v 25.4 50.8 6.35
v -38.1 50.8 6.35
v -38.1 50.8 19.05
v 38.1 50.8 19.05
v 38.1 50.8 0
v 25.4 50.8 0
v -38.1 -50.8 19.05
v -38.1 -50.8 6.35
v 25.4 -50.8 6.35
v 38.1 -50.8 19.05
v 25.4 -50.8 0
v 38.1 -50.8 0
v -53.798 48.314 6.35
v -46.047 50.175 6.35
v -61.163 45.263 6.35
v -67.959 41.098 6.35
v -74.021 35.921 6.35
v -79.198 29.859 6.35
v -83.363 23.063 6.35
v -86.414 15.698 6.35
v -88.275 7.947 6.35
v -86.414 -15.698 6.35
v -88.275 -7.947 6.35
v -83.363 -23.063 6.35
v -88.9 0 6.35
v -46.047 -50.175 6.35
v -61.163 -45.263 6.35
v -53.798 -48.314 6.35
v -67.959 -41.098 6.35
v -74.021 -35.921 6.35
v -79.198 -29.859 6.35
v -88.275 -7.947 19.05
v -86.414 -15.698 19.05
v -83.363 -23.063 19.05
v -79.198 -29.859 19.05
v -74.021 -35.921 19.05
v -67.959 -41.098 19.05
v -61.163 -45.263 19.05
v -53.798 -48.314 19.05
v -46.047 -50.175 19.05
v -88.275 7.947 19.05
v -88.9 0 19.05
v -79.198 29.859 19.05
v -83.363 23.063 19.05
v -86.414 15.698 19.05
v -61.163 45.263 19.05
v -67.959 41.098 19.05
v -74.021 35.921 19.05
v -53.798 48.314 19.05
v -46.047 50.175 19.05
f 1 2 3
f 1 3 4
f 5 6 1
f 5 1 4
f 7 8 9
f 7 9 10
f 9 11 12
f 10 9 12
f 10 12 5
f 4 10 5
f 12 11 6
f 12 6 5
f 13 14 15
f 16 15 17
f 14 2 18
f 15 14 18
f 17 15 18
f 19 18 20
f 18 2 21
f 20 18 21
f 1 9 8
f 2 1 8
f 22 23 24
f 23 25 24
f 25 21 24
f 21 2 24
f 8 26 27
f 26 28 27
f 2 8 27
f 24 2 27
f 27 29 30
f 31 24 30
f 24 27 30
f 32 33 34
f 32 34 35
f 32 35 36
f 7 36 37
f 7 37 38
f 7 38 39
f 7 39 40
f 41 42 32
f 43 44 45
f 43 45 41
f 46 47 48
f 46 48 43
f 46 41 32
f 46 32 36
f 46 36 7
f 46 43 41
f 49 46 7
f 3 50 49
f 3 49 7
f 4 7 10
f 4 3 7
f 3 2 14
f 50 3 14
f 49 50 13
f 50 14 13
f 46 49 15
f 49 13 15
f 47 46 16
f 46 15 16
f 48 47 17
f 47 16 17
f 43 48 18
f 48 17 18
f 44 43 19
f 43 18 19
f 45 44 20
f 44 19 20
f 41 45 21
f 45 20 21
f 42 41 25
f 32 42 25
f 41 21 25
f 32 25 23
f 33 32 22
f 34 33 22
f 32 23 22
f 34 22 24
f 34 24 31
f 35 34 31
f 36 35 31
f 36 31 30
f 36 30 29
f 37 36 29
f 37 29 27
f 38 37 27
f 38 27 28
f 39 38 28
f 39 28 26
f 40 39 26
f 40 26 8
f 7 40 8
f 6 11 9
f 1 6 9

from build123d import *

# Parameters (mm, degrees)
F0_W     = 76.2
F0_H     = 101.6
F1_DEPTH = 19.05
F2_W     = 63.5
F2_H     = 6.35
F3_DEPTH = 164.846


with BuildPart() as f1:
    # F0 (on Top) → F1 (new body)
    with BuildSketch(Plane.XY):
        Rectangle(F0_W, F0_H)
        with BuildLine():
            ThreePointArc((-38.1, 50.8), (-88.9, 0), (-38.1, -50.8))
            Line((-38.1, -50.8), (-38.1, 50.8))
        make_face()
    extrude(amount=F1_DEPTH)

    # F2 (on face) → F3 (cut)
    with BuildSketch(Plane.XZ.offset(50.8)):
        with Locations((-6.35, 3.175)):
            Rectangle(F2_W, F2_H)
        Polygon((25.4, -12.1961906552), (25.4, 0), (-38.1, 0), (-38.1, 6.35), (-98.2422232628, 6.35), (-98.2422232628, -12.1961906552), align=None)
    extrude(amount=-F3_DEPTH, mode=Mode.SUBTRACT)


solid = f1.part
